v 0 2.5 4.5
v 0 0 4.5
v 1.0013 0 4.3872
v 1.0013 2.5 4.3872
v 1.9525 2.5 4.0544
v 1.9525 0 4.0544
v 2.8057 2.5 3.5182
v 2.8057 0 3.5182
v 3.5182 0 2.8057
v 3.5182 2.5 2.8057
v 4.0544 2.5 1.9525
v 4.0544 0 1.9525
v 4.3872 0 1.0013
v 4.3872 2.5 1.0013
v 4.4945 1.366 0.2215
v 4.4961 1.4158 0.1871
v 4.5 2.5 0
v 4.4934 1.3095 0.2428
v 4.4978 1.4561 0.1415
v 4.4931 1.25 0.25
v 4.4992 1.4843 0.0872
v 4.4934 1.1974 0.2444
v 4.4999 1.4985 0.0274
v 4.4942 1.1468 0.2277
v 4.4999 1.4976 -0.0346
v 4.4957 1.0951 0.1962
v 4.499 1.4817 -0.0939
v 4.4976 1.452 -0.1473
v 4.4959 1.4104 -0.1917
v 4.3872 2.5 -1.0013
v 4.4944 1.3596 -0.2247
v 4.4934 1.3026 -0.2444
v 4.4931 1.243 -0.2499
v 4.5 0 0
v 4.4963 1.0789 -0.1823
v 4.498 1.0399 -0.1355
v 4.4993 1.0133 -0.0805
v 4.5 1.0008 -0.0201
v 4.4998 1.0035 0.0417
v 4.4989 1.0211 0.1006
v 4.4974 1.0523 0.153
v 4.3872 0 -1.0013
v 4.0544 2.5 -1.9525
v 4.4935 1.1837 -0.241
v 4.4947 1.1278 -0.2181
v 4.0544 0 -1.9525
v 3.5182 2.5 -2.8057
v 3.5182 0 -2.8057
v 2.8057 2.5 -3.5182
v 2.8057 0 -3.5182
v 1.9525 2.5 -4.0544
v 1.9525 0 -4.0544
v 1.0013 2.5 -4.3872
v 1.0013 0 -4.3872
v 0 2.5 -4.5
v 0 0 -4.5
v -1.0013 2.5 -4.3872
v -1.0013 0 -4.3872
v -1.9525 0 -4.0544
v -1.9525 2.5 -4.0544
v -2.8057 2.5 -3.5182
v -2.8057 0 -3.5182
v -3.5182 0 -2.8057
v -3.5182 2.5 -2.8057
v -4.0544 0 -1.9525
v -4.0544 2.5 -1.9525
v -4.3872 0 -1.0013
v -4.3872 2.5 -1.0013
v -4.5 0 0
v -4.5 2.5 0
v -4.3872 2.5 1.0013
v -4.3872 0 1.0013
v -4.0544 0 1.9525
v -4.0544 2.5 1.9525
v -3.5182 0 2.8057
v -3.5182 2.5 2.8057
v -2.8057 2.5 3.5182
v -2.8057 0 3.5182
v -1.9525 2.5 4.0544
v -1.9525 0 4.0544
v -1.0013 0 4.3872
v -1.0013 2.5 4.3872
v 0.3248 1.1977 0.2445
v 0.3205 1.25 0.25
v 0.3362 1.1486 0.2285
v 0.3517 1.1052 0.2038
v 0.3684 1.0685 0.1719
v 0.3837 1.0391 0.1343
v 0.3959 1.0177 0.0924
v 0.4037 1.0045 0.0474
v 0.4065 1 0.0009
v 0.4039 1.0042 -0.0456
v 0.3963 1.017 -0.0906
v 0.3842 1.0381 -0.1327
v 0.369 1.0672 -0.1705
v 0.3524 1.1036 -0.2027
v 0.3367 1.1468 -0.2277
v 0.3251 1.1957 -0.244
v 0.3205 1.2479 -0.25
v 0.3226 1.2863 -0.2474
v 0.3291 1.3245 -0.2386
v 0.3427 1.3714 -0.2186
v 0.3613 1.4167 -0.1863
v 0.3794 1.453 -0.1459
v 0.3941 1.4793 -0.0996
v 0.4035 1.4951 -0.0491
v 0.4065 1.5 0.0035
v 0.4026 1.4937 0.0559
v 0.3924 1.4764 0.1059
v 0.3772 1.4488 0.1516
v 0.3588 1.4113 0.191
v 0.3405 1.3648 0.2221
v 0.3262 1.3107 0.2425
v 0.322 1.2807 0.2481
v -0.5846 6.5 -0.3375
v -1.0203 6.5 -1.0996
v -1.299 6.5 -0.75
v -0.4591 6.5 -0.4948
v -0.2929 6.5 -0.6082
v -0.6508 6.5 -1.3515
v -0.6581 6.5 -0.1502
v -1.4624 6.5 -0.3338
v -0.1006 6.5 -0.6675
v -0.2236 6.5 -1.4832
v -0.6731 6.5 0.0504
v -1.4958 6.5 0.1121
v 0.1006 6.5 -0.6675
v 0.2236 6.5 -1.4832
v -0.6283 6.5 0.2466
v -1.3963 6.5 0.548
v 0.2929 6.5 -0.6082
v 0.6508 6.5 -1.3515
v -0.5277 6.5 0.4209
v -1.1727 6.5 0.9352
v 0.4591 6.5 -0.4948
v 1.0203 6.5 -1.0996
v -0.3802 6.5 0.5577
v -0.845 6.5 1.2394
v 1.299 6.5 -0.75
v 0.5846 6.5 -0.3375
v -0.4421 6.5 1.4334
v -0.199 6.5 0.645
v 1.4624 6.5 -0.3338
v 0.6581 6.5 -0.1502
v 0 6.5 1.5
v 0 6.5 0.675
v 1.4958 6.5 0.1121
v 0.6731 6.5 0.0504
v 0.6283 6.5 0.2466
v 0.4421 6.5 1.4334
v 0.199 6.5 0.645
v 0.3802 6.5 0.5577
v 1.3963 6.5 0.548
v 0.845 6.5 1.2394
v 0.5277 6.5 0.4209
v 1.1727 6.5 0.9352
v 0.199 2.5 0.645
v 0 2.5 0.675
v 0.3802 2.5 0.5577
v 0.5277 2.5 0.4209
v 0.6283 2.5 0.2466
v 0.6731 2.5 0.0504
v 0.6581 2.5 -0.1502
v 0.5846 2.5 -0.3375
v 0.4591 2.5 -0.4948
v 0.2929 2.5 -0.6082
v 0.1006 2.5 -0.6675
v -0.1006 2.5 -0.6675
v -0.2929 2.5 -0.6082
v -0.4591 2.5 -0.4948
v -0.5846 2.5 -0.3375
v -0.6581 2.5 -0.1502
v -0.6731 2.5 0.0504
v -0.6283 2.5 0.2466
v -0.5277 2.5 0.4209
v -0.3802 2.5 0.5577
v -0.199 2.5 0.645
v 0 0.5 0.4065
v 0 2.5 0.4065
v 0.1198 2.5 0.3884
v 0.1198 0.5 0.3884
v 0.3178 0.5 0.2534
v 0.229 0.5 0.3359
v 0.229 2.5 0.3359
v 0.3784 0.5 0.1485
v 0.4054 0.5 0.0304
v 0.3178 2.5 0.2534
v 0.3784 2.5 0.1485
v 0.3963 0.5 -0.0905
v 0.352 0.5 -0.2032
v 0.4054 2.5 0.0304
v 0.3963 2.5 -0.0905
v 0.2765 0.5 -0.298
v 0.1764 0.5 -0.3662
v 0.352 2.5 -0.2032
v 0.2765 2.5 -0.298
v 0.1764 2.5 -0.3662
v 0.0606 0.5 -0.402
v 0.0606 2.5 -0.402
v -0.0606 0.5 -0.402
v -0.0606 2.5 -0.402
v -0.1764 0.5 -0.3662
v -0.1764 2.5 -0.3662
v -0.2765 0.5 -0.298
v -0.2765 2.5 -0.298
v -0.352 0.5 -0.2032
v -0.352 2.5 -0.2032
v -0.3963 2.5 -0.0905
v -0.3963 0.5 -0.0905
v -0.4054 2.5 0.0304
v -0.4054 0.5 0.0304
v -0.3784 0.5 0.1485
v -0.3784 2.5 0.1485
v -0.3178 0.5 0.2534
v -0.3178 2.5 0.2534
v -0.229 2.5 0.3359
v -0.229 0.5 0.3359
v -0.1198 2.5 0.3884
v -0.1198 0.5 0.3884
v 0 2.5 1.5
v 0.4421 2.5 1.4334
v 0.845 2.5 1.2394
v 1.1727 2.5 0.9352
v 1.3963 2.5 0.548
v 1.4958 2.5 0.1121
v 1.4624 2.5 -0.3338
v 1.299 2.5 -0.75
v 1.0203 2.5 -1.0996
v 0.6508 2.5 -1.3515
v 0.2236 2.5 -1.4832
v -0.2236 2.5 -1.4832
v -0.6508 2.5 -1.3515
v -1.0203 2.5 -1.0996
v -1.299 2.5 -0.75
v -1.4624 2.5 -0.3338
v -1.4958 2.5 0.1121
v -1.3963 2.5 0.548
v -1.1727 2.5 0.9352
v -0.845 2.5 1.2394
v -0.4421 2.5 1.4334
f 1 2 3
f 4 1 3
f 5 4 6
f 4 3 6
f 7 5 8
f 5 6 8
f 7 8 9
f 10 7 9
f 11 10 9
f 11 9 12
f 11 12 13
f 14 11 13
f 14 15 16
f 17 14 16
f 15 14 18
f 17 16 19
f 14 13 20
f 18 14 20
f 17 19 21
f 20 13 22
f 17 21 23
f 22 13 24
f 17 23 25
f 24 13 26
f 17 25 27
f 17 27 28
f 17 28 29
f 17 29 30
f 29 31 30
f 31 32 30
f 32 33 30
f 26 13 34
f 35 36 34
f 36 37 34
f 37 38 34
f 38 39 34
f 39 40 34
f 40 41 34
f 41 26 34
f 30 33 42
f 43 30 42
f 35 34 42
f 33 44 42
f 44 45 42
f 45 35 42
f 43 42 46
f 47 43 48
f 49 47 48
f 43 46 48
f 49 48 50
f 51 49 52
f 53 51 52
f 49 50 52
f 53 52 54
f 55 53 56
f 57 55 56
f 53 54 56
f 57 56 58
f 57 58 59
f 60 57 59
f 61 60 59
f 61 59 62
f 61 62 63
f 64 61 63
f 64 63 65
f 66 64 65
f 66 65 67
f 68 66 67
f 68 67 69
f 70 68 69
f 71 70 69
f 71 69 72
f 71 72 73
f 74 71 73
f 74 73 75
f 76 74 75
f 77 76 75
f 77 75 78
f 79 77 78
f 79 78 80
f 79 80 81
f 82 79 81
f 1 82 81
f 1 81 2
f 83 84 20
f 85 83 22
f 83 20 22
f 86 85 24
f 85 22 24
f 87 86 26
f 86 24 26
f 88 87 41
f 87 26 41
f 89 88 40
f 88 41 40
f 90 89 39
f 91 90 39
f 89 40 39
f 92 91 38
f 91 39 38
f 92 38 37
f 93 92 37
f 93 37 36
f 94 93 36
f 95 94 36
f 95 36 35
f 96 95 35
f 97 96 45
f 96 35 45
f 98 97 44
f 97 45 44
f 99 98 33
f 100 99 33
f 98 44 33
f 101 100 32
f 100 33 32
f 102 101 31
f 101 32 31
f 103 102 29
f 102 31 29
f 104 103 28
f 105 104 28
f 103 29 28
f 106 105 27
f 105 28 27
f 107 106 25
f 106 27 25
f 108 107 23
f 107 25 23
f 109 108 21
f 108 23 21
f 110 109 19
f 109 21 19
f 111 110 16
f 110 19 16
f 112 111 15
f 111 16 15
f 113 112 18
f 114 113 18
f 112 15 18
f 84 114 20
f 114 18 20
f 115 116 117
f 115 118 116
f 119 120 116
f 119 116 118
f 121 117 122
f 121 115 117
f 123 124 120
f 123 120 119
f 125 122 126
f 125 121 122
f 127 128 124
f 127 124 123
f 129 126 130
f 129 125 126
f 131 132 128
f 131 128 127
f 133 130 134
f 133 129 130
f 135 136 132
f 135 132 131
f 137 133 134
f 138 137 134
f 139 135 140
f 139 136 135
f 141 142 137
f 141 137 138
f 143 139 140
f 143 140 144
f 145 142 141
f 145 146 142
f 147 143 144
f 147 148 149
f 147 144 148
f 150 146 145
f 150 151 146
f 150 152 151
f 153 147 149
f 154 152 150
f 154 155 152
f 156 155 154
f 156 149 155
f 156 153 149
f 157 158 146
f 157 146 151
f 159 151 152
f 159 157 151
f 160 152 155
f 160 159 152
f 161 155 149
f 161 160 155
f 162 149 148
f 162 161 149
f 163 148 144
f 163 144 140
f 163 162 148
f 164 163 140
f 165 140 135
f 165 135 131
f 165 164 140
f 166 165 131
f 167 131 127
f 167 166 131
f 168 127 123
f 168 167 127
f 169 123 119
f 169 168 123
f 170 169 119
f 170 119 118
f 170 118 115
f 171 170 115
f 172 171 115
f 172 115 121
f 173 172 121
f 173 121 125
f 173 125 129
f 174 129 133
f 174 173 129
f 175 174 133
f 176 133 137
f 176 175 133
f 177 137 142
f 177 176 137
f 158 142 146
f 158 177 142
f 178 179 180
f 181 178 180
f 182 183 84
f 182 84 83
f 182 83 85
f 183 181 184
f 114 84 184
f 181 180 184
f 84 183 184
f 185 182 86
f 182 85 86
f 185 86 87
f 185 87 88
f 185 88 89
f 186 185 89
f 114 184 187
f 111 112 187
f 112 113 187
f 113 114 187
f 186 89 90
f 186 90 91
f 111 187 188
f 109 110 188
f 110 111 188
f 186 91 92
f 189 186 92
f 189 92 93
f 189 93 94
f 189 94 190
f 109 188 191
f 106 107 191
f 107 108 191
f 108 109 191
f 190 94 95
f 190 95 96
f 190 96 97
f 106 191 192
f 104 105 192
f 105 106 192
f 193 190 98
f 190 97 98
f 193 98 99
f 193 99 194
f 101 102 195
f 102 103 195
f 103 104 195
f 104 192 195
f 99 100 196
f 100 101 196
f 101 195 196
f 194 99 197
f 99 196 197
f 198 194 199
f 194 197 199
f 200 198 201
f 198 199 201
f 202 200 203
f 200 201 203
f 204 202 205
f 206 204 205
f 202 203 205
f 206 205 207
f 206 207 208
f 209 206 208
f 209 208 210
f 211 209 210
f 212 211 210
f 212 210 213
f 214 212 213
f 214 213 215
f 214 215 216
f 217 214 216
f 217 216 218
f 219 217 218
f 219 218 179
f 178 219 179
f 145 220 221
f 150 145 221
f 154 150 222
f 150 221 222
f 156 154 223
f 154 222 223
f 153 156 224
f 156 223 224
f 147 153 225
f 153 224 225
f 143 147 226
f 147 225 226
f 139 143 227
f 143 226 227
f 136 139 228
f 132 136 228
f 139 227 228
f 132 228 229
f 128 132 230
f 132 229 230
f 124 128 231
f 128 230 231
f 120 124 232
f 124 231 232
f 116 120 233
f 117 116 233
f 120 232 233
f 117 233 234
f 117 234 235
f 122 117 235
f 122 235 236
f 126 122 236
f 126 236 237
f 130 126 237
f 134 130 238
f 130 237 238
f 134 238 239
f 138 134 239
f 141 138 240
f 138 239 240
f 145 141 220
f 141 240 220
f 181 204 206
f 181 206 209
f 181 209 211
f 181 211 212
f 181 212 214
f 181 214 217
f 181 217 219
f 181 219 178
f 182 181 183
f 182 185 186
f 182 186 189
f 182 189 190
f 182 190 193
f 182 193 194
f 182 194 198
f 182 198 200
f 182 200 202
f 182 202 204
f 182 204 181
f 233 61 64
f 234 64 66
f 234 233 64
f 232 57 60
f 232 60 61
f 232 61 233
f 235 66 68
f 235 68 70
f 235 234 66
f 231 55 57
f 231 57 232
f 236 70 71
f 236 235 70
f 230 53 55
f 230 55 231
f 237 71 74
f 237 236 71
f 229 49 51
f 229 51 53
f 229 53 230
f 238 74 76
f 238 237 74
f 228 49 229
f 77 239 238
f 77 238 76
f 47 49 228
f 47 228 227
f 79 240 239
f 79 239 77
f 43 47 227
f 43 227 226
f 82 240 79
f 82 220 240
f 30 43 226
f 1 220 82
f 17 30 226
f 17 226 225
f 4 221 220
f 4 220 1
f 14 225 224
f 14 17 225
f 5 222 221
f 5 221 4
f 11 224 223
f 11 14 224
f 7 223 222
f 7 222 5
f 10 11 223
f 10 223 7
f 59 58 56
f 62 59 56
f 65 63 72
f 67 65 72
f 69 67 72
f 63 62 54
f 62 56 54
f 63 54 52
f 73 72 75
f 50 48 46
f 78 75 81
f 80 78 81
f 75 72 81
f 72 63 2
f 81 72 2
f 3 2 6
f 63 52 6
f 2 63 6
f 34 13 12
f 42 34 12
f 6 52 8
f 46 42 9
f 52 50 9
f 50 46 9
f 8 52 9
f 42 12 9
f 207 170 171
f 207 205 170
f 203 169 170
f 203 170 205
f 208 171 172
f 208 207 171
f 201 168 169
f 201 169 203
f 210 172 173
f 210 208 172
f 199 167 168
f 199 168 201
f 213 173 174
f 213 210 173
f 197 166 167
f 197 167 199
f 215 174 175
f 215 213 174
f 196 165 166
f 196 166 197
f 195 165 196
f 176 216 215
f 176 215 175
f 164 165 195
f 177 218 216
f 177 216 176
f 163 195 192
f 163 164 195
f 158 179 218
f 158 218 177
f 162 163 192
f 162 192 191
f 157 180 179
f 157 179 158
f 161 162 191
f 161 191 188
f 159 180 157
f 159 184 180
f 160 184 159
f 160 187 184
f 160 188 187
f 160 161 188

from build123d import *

# Parameters (mm, degrees)
SKETCH1_R           = 4.5
BOSS_EXTRUDE1_DEPTH = 2.5
SKETCH2_R           = 1.5
SKETCH2_R_2         = 0.675
BOSS_EXTRUDE2_DEPTH = 4
SKETCH3_W           = 4.5
SKETCH3_H           = 0.25
SKETCH5_R           = 0.406492391
CUT_EXTRUDE2_DEPTH  = 2


with BuildPart() as part:
    # Sketch1 → Boss-Extrude1 (new body)
    with BuildSketch(Plane(origin=(0, 0, 0), x_dir=(1, 0, 0), z_dir=(0, 1, 0))):
        with Locations(Location((0, 0, 0), (0, 0, 270))):
            Circle(SKETCH1_R)
    extrude(amount=BOSS_EXTRUDE1_DEPTH)

    # Sketch2 → Boss-Extrude2 (add)
    with BuildSketch(Plane(origin=(0, 2.5, 0), x_dir=(1, 0, 0), z_dir=(0, 1, 0))):
        with Locations(Location((0, 0, 0), (0, 0, 270))):
            Circle(SKETCH2_R)
        with Locations(Location((0, 0, 0), (0, 0, 270))):
            Circle(SKETCH2_R_2, mode=Mode.SUBTRACT)
    extrude(amount=BOSS_EXTRUDE2_DEPTH)

    # Sketch3 → Cut-Revolve1 (revolve, cut)
    with BuildSketch(Plane.XY, mode=Mode.PRIVATE) as cut_revolve1_sk:
        with Locations((2.25, 1.375)):
            Rectangle(SKETCH3_W, SKETCH3_H)
    revolve(cut_revolve1_sk.sketch.rotate(Axis((0, 1.25, 0), (1, 0, 0)), 90), axis=Axis((0, 1.25, 0), (1, 0, 0)), mode=Mode.SUBTRACT)

    # Sketch5 → Cut-Extrude2 (cut)
    with BuildSketch(Plane(origin=(0, 2.5, 0), x_dir=(1, 0, 0), z_dir=(0, 1, 0))):
        with Locations(Location((0, 0, 0), (0, 0, 270))):
            Circle(SKETCH5_R)
    extrude(amount=-CUT_EXTRUDE2_DEPTH, mode=Mode.SUBTRACT)


solid = part.part
